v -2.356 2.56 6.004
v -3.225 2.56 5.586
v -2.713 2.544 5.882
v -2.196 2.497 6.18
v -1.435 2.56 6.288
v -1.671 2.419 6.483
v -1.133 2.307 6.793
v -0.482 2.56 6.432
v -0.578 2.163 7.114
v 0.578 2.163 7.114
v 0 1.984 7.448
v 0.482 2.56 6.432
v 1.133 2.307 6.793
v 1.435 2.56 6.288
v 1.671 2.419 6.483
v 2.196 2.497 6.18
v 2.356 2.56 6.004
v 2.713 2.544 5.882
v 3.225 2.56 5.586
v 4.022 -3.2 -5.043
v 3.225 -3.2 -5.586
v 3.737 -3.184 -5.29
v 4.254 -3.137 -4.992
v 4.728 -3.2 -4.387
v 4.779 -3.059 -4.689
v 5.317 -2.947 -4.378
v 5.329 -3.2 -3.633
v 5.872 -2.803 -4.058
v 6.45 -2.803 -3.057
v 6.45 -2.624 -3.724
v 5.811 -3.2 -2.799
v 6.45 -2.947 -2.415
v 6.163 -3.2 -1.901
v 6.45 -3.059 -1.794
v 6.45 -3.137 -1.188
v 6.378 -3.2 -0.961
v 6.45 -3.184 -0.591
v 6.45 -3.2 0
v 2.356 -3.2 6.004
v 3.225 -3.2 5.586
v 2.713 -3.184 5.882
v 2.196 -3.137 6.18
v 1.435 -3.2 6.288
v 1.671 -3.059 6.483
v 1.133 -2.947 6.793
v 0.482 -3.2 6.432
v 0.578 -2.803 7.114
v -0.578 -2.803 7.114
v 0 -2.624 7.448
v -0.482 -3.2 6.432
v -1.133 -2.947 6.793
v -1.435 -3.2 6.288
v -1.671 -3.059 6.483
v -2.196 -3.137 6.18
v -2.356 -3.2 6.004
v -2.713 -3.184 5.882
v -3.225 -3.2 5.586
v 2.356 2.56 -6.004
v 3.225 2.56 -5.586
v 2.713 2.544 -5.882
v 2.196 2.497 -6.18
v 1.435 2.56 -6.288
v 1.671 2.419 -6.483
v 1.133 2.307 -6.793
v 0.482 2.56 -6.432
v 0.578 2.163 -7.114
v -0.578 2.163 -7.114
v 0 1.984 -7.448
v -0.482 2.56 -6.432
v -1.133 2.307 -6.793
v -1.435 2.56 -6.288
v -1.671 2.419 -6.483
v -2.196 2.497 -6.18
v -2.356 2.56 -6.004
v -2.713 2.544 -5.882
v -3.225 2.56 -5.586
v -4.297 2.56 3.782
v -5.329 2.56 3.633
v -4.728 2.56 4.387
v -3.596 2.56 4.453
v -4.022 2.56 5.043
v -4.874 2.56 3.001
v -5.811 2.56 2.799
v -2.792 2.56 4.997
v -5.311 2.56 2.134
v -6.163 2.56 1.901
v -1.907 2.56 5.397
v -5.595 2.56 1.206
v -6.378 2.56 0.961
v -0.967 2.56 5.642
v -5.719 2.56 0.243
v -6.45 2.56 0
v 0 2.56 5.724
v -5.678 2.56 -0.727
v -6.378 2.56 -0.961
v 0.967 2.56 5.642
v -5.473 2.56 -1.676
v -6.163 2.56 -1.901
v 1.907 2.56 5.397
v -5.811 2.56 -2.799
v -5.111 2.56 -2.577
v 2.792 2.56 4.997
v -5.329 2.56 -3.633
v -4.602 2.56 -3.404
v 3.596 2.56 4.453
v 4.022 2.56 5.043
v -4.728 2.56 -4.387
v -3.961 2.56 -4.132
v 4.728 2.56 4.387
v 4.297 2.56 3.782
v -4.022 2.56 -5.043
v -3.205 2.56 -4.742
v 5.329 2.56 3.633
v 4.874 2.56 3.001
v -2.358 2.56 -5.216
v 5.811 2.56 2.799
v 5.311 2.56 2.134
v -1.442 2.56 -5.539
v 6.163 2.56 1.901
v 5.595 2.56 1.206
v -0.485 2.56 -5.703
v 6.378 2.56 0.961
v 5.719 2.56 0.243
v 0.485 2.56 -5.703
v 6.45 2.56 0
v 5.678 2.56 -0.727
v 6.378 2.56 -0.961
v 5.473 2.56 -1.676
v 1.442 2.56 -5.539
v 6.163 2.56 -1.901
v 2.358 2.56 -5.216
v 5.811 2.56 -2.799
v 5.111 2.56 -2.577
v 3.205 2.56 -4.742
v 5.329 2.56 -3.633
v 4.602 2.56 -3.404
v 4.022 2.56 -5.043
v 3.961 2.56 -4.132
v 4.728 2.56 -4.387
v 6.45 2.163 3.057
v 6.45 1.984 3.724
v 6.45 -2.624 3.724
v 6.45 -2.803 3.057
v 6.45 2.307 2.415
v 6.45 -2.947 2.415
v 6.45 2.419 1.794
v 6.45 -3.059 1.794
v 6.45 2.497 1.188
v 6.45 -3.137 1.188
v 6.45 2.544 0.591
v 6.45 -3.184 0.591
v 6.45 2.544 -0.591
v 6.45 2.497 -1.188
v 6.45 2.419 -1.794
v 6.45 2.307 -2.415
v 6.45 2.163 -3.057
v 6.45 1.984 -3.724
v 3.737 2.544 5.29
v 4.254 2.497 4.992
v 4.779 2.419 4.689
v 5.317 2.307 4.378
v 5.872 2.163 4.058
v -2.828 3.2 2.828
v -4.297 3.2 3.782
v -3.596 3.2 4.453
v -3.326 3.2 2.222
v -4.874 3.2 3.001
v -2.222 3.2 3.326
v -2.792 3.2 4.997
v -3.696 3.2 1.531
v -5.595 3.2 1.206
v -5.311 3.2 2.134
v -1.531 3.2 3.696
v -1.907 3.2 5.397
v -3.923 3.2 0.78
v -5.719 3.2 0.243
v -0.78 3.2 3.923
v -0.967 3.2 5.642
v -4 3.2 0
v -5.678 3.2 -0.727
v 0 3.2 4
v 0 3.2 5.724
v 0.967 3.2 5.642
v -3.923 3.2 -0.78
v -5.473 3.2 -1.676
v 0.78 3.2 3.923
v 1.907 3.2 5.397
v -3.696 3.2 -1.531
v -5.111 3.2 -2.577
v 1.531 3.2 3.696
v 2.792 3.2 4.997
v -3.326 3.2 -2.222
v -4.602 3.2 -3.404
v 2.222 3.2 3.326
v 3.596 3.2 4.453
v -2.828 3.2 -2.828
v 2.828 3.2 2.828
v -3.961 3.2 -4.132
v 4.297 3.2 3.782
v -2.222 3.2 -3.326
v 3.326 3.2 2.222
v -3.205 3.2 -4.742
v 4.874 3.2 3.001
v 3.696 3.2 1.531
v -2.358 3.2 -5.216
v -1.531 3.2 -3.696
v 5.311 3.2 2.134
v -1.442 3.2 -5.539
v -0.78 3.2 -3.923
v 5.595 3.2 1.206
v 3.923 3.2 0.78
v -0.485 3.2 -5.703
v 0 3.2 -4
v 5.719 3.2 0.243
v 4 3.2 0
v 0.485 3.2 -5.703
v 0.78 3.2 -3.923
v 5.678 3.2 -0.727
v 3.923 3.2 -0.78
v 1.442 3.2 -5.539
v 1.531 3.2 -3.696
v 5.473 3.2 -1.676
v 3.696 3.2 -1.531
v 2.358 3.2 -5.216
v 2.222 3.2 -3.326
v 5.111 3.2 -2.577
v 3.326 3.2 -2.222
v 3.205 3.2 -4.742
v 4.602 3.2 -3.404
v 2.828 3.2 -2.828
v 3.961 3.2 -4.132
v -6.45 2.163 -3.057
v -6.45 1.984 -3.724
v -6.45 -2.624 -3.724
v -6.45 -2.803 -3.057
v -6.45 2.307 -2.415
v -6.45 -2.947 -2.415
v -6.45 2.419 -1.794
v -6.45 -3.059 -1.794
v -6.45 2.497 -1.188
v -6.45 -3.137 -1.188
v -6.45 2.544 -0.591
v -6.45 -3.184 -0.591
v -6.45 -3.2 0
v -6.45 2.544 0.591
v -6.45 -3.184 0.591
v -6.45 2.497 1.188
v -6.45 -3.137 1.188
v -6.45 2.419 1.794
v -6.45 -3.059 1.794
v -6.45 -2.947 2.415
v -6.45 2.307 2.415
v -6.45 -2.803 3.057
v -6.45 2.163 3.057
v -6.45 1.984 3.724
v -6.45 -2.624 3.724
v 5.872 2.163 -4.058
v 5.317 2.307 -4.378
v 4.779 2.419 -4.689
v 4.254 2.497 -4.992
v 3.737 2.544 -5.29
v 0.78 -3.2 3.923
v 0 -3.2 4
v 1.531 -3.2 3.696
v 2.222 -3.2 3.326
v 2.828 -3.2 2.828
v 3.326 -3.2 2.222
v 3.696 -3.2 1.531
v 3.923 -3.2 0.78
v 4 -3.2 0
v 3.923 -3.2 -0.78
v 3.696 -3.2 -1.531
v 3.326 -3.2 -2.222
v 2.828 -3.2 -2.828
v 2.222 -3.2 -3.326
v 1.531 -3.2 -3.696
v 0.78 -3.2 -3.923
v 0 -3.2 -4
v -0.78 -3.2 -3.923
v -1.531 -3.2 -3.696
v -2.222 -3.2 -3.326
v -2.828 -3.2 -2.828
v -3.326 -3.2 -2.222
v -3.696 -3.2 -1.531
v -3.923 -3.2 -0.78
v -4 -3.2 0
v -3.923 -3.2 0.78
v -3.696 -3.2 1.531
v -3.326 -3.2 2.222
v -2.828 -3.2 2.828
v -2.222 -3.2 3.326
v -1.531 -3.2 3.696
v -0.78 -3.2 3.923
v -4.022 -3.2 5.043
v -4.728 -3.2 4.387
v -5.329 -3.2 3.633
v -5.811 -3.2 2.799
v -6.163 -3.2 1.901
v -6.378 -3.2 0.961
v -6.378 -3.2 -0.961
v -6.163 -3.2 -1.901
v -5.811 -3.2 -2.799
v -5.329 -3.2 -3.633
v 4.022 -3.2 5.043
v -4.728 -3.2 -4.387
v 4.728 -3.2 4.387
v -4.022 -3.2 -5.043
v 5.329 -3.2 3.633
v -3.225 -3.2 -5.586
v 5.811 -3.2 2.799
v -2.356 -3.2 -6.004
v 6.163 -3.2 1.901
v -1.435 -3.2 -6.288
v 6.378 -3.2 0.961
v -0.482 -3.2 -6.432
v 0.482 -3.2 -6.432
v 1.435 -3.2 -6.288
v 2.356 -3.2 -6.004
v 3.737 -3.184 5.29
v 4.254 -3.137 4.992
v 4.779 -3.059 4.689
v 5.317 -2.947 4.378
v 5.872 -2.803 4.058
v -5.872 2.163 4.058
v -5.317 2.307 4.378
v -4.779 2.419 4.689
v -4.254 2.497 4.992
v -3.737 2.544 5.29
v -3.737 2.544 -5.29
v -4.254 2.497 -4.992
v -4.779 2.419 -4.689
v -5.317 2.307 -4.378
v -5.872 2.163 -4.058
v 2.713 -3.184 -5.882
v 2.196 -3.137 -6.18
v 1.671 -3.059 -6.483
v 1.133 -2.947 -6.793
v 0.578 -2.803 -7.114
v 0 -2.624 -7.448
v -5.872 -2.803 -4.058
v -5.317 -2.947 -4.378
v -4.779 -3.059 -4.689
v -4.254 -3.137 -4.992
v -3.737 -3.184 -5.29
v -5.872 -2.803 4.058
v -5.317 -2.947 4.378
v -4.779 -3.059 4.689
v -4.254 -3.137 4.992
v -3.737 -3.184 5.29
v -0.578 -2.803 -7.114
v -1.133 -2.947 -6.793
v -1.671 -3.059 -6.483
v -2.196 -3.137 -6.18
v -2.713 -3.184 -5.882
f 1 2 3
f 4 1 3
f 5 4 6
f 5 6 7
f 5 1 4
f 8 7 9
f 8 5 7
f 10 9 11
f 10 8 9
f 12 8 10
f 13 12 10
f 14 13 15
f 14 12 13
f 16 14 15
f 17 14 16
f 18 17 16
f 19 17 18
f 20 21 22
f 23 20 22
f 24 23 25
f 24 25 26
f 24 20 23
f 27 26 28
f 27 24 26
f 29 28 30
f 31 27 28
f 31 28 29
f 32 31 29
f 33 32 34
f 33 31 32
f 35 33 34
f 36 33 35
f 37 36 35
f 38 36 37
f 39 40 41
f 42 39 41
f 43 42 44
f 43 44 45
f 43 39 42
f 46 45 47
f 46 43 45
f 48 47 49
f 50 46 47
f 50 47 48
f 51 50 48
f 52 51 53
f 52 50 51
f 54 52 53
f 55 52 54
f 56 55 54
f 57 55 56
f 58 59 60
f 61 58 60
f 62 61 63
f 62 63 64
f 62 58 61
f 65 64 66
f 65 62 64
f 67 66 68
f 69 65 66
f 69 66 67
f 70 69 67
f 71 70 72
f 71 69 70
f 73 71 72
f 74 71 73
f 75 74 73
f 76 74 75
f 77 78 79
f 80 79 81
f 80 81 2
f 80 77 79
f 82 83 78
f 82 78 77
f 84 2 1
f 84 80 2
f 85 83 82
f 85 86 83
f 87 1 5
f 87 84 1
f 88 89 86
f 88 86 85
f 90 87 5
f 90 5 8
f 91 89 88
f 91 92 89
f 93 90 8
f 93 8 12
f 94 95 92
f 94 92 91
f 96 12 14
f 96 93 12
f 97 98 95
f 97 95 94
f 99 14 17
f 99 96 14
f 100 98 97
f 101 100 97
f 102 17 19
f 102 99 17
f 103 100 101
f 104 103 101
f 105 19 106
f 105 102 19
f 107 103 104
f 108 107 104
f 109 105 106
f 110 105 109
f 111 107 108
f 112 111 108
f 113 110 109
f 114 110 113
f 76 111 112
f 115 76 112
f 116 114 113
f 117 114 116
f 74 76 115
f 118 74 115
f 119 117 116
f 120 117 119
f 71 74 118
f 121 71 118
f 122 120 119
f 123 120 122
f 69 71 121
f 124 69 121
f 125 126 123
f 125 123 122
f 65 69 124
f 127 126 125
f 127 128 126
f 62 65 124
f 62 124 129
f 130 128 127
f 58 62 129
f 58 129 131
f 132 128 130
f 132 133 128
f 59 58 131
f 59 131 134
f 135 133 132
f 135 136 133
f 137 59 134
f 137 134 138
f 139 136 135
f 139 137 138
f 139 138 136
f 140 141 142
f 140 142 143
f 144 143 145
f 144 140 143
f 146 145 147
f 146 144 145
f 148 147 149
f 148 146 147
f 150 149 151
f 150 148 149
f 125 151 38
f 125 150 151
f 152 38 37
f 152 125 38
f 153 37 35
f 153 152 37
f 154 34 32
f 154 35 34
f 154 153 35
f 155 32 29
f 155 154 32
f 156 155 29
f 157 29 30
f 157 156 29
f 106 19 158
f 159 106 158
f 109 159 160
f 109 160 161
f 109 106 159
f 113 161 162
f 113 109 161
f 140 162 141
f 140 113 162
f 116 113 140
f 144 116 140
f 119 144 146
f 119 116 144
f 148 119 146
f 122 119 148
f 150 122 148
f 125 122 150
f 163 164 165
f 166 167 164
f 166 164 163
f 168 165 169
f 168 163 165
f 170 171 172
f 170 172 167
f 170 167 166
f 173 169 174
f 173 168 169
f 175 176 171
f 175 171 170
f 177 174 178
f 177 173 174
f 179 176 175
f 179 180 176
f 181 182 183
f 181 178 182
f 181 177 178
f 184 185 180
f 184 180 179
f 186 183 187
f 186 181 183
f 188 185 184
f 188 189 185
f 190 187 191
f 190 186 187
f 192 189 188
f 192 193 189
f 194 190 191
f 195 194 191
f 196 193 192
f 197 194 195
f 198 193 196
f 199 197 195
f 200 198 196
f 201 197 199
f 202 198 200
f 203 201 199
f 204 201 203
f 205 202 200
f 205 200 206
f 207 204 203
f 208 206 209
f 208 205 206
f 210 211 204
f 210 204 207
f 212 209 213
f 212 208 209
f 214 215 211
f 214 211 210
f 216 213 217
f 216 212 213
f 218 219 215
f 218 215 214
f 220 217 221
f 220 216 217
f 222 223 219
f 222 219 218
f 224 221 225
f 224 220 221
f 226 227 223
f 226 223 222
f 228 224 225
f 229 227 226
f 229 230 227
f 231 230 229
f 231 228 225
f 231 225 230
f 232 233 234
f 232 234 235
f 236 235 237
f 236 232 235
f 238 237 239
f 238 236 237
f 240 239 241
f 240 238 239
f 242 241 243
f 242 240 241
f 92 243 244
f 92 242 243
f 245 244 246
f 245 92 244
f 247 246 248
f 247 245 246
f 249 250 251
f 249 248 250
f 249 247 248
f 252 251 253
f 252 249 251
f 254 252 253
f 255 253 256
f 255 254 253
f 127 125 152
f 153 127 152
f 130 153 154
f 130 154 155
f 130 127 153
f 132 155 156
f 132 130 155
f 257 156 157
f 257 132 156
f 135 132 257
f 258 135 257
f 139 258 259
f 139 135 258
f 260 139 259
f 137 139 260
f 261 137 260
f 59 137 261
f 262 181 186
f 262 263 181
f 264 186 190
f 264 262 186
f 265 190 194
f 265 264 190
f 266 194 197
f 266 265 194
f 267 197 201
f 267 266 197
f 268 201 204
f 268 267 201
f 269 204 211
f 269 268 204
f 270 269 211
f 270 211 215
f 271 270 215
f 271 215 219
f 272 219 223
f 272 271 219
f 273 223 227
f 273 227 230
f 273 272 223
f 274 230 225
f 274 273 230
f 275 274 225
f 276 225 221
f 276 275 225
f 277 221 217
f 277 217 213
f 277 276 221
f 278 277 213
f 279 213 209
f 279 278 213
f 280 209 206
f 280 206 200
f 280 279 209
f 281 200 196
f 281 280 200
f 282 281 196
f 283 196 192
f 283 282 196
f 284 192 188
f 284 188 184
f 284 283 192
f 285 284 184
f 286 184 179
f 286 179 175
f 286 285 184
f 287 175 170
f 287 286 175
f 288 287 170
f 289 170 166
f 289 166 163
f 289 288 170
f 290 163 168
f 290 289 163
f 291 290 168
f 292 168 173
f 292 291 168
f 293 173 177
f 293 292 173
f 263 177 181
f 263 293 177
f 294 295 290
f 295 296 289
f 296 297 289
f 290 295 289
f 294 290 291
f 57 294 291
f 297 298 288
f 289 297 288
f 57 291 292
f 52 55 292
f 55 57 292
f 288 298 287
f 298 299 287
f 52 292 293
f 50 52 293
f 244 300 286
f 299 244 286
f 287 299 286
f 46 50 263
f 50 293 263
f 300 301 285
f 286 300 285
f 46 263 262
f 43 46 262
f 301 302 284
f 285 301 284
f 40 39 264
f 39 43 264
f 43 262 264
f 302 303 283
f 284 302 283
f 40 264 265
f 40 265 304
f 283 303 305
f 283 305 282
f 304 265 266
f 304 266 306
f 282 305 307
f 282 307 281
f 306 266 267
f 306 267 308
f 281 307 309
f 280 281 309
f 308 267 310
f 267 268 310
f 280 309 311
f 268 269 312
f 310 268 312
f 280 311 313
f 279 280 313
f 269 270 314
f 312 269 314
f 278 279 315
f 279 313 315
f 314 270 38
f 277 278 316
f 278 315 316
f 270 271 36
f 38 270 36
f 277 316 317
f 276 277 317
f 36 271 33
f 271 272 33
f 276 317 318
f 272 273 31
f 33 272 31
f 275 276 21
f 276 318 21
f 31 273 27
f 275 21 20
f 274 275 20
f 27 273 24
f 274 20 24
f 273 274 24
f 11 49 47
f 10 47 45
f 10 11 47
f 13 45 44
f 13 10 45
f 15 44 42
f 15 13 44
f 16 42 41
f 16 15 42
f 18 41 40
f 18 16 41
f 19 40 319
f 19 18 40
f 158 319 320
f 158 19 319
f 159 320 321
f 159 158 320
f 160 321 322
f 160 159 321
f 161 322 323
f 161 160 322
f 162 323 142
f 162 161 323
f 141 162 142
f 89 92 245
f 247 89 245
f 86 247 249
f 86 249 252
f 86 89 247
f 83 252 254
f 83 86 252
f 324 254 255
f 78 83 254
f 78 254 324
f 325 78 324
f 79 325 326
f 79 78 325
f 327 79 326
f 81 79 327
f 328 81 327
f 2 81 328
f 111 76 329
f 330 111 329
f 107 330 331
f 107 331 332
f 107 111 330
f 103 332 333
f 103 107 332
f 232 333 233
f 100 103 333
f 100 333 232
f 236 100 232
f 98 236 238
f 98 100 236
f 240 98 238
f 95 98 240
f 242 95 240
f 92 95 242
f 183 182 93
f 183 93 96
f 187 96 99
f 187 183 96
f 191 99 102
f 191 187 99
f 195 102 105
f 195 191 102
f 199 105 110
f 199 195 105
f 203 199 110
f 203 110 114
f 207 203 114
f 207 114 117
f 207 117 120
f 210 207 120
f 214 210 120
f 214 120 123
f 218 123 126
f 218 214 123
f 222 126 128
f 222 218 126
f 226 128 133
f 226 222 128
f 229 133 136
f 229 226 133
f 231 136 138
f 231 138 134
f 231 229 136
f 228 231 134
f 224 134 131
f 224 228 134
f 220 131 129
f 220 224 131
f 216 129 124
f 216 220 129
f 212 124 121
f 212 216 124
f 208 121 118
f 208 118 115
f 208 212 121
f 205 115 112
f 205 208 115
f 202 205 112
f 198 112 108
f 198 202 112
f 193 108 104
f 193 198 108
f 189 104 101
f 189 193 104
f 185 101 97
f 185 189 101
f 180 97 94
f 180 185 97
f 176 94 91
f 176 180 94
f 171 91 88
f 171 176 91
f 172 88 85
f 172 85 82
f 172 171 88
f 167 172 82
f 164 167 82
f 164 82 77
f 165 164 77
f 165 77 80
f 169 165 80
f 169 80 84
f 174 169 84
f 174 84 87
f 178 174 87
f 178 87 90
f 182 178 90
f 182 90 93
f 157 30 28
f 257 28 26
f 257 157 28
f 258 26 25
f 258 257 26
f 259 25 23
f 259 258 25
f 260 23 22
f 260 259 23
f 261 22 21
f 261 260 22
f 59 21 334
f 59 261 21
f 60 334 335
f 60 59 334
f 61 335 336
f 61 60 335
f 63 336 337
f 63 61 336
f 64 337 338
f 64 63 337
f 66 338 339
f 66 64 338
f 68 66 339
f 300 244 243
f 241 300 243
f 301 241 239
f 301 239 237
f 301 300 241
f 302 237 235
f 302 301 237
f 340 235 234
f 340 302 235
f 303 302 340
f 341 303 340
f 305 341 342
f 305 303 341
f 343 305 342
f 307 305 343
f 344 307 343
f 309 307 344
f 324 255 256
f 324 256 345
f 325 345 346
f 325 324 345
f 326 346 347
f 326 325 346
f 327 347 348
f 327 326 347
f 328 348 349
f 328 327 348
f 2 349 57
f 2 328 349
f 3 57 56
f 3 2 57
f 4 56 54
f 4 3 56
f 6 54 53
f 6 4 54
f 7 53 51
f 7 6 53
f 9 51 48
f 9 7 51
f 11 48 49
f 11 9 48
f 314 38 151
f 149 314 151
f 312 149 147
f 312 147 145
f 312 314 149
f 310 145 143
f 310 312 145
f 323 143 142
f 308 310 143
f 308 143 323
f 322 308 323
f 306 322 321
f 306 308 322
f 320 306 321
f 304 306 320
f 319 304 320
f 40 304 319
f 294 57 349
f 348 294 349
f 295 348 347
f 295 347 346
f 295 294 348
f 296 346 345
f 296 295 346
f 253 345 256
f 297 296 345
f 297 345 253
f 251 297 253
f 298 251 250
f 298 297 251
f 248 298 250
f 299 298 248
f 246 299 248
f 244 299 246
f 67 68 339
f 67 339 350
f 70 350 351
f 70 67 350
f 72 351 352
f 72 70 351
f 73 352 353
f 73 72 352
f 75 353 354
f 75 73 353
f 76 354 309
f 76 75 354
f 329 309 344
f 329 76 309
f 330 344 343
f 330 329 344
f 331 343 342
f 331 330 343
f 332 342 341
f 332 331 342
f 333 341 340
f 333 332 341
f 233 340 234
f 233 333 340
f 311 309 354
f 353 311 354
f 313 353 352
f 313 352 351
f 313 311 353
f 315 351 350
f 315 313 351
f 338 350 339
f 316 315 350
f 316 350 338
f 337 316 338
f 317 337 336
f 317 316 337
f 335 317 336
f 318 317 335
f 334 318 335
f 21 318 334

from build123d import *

# Parameters (mm, degrees)
SKETCH1_R               = 4
BOSS_EXTRUDE1_DEPTH     = 3.2
SKETCH9_OUTSIDE_W       = 19.044
SKETCH9_OUTSIDE_H       = 21.04
SKETCH9_OUTSIDE_R       = 5.723909236
CUT_EXTRUDE3_DEPTH      = 0.64
SKETCH5_OUTSIDE_W       = 62.042
SKETCH5_OUTSIDE_H       = 64.038
SKETCH5_OUTSIDE_R       = 6.45
CUT_EXTRUDE2_DEPTH      = 12.412716592
CUT_EXTRUDE2_DRAFT      = -60
MIRROR1_COPY_1_SKETCH_W = 62.042
MIRROR1_COPY_1_SKETCH_H = 64.038
MIRROR1_COPY_1_SKETCH_R = 6.45
MIRROR1_COPY_1_DEPTH    = 12.412716592
MIRROR1_COPY_1_DRAFT    = -60


with BuildPart() as part:
    # Sketch1 → Boss-Extrude1 (new, symmetric)
    with BuildSketch(Plane(origin=(0, 0, 0), x_dir=(1, 0, 0), z_dir=(0, 1, 0))):
        Polygon((-6.45, 3.723909236), (-6.45, -3.723909236), (0, -7.447818473), (6.45, -3.723909236), (6.45, 3.723909236), (0, 7.447818473), align=None)
        with Locations(Location((0, 0, 0), (0, 0, 270))):
            Circle(SKETCH1_R, mode=Mode.SUBTRACT)
    extrude(amount=BOSS_EXTRUDE1_DEPTH, both=True)

    # Sketch9 outside → Cut-Extrude3 (cut)
    with BuildSketch(Plane(origin=(0, 3.2, 0), x_dir=(1, 0, 0), z_dir=(0, 1, 0))):
        Rectangle(SKETCH9_OUTSIDE_W, SKETCH9_OUTSIDE_H)
        with Locations(Location((0, 0, 0), (0, 0, 270))):
            Circle(SKETCH9_OUTSIDE_R, mode=Mode.SUBTRACT)
    extrude(amount=-CUT_EXTRUDE3_DEPTH, mode=Mode.SUBTRACT)


with BuildPart() as cut_extrude2_tool:
    # Sketch5 outside → Cut-Extrude2 (with draft: the straight prism first)
    with BuildSketch(Plane(origin=(0, 2.56, 0), x_dir=(1, 0, 0), z_dir=(0, 1, 0))):
        Rectangle(SKETCH5_OUTSIDE_W, SKETCH5_OUTSIDE_H)
        Circle(SKETCH5_OUTSIDE_R, mode=Mode.SUBTRACT)
    extrude(amount=-CUT_EXTRUDE2_DEPTH)
    # Cut-Extrude2: the draft: its side faces are tilted about the plane it starts from
    cut_extrude2_sides = [cut_extrude2_tool.faces().sort_by_distance(p)[0] for p in [
        (0, -3.646358296, 32.019),
        (31.021, -3.646358296, 0),
        (0, -3.646358296, -32.019),
        (-31.021, -3.646358296, 0),
        (-6.45, -3.646358296, 0),
    ]]
    draft(cut_extrude2_sides, Plane(origin=(0, 2.56, 0), x_dir=(1, 0, 0), z_dir=(0, 1, 0)), CUT_EXTRUDE2_DRAFT)


with BuildPart() as part_1:
    add(part.part)

    # Cut-Extrude2: cut by cut_extrude2_tool
    add(cut_extrude2_tool.part, mode=Mode.SUBTRACT)


with BuildPart() as mirror1_copy_1_tool:
    # Mirror1 copy 1 sketch → Mirror1 copy 1 (with draft: the straight prism first)
    with BuildSketch(Plane.XZ.offset(3.2)):
        Rectangle(MIRROR1_COPY_1_SKETCH_W, MIRROR1_COPY_1_SKETCH_H)
        Circle(MIRROR1_COPY_1_SKETCH_R, mode=Mode.SUBTRACT)
    extrude(amount=-MIRROR1_COPY_1_DEPTH)
    # Mirror1 copy 1: the draft: its side faces are tilted about the plane it starts from
    mirror1_copy_1_sides = [mirror1_copy_1_tool.faces().sort_by_distance(p)[0] for p in [
        (0, 3.006358296, 32.019),
        (31.021, 3.006358296, 0),
        (0, 3.006358296, -32.019),
        (-31.021, 3.006358296, 0),
        (-6.45, 3.006358296, 0),
    ]]
    draft(mirror1_copy_1_sides, Plane.XZ.offset(3.2), MIRROR1_COPY_1_DRAFT)


with BuildPart() as part_2:
    add(part_1.part)

    # Mirror1 copy 1: cut by mirror1_copy_1_tool
    add(mirror1_copy_1_tool.part, mode=Mode.SUBTRACT)


solid = part_2.part
